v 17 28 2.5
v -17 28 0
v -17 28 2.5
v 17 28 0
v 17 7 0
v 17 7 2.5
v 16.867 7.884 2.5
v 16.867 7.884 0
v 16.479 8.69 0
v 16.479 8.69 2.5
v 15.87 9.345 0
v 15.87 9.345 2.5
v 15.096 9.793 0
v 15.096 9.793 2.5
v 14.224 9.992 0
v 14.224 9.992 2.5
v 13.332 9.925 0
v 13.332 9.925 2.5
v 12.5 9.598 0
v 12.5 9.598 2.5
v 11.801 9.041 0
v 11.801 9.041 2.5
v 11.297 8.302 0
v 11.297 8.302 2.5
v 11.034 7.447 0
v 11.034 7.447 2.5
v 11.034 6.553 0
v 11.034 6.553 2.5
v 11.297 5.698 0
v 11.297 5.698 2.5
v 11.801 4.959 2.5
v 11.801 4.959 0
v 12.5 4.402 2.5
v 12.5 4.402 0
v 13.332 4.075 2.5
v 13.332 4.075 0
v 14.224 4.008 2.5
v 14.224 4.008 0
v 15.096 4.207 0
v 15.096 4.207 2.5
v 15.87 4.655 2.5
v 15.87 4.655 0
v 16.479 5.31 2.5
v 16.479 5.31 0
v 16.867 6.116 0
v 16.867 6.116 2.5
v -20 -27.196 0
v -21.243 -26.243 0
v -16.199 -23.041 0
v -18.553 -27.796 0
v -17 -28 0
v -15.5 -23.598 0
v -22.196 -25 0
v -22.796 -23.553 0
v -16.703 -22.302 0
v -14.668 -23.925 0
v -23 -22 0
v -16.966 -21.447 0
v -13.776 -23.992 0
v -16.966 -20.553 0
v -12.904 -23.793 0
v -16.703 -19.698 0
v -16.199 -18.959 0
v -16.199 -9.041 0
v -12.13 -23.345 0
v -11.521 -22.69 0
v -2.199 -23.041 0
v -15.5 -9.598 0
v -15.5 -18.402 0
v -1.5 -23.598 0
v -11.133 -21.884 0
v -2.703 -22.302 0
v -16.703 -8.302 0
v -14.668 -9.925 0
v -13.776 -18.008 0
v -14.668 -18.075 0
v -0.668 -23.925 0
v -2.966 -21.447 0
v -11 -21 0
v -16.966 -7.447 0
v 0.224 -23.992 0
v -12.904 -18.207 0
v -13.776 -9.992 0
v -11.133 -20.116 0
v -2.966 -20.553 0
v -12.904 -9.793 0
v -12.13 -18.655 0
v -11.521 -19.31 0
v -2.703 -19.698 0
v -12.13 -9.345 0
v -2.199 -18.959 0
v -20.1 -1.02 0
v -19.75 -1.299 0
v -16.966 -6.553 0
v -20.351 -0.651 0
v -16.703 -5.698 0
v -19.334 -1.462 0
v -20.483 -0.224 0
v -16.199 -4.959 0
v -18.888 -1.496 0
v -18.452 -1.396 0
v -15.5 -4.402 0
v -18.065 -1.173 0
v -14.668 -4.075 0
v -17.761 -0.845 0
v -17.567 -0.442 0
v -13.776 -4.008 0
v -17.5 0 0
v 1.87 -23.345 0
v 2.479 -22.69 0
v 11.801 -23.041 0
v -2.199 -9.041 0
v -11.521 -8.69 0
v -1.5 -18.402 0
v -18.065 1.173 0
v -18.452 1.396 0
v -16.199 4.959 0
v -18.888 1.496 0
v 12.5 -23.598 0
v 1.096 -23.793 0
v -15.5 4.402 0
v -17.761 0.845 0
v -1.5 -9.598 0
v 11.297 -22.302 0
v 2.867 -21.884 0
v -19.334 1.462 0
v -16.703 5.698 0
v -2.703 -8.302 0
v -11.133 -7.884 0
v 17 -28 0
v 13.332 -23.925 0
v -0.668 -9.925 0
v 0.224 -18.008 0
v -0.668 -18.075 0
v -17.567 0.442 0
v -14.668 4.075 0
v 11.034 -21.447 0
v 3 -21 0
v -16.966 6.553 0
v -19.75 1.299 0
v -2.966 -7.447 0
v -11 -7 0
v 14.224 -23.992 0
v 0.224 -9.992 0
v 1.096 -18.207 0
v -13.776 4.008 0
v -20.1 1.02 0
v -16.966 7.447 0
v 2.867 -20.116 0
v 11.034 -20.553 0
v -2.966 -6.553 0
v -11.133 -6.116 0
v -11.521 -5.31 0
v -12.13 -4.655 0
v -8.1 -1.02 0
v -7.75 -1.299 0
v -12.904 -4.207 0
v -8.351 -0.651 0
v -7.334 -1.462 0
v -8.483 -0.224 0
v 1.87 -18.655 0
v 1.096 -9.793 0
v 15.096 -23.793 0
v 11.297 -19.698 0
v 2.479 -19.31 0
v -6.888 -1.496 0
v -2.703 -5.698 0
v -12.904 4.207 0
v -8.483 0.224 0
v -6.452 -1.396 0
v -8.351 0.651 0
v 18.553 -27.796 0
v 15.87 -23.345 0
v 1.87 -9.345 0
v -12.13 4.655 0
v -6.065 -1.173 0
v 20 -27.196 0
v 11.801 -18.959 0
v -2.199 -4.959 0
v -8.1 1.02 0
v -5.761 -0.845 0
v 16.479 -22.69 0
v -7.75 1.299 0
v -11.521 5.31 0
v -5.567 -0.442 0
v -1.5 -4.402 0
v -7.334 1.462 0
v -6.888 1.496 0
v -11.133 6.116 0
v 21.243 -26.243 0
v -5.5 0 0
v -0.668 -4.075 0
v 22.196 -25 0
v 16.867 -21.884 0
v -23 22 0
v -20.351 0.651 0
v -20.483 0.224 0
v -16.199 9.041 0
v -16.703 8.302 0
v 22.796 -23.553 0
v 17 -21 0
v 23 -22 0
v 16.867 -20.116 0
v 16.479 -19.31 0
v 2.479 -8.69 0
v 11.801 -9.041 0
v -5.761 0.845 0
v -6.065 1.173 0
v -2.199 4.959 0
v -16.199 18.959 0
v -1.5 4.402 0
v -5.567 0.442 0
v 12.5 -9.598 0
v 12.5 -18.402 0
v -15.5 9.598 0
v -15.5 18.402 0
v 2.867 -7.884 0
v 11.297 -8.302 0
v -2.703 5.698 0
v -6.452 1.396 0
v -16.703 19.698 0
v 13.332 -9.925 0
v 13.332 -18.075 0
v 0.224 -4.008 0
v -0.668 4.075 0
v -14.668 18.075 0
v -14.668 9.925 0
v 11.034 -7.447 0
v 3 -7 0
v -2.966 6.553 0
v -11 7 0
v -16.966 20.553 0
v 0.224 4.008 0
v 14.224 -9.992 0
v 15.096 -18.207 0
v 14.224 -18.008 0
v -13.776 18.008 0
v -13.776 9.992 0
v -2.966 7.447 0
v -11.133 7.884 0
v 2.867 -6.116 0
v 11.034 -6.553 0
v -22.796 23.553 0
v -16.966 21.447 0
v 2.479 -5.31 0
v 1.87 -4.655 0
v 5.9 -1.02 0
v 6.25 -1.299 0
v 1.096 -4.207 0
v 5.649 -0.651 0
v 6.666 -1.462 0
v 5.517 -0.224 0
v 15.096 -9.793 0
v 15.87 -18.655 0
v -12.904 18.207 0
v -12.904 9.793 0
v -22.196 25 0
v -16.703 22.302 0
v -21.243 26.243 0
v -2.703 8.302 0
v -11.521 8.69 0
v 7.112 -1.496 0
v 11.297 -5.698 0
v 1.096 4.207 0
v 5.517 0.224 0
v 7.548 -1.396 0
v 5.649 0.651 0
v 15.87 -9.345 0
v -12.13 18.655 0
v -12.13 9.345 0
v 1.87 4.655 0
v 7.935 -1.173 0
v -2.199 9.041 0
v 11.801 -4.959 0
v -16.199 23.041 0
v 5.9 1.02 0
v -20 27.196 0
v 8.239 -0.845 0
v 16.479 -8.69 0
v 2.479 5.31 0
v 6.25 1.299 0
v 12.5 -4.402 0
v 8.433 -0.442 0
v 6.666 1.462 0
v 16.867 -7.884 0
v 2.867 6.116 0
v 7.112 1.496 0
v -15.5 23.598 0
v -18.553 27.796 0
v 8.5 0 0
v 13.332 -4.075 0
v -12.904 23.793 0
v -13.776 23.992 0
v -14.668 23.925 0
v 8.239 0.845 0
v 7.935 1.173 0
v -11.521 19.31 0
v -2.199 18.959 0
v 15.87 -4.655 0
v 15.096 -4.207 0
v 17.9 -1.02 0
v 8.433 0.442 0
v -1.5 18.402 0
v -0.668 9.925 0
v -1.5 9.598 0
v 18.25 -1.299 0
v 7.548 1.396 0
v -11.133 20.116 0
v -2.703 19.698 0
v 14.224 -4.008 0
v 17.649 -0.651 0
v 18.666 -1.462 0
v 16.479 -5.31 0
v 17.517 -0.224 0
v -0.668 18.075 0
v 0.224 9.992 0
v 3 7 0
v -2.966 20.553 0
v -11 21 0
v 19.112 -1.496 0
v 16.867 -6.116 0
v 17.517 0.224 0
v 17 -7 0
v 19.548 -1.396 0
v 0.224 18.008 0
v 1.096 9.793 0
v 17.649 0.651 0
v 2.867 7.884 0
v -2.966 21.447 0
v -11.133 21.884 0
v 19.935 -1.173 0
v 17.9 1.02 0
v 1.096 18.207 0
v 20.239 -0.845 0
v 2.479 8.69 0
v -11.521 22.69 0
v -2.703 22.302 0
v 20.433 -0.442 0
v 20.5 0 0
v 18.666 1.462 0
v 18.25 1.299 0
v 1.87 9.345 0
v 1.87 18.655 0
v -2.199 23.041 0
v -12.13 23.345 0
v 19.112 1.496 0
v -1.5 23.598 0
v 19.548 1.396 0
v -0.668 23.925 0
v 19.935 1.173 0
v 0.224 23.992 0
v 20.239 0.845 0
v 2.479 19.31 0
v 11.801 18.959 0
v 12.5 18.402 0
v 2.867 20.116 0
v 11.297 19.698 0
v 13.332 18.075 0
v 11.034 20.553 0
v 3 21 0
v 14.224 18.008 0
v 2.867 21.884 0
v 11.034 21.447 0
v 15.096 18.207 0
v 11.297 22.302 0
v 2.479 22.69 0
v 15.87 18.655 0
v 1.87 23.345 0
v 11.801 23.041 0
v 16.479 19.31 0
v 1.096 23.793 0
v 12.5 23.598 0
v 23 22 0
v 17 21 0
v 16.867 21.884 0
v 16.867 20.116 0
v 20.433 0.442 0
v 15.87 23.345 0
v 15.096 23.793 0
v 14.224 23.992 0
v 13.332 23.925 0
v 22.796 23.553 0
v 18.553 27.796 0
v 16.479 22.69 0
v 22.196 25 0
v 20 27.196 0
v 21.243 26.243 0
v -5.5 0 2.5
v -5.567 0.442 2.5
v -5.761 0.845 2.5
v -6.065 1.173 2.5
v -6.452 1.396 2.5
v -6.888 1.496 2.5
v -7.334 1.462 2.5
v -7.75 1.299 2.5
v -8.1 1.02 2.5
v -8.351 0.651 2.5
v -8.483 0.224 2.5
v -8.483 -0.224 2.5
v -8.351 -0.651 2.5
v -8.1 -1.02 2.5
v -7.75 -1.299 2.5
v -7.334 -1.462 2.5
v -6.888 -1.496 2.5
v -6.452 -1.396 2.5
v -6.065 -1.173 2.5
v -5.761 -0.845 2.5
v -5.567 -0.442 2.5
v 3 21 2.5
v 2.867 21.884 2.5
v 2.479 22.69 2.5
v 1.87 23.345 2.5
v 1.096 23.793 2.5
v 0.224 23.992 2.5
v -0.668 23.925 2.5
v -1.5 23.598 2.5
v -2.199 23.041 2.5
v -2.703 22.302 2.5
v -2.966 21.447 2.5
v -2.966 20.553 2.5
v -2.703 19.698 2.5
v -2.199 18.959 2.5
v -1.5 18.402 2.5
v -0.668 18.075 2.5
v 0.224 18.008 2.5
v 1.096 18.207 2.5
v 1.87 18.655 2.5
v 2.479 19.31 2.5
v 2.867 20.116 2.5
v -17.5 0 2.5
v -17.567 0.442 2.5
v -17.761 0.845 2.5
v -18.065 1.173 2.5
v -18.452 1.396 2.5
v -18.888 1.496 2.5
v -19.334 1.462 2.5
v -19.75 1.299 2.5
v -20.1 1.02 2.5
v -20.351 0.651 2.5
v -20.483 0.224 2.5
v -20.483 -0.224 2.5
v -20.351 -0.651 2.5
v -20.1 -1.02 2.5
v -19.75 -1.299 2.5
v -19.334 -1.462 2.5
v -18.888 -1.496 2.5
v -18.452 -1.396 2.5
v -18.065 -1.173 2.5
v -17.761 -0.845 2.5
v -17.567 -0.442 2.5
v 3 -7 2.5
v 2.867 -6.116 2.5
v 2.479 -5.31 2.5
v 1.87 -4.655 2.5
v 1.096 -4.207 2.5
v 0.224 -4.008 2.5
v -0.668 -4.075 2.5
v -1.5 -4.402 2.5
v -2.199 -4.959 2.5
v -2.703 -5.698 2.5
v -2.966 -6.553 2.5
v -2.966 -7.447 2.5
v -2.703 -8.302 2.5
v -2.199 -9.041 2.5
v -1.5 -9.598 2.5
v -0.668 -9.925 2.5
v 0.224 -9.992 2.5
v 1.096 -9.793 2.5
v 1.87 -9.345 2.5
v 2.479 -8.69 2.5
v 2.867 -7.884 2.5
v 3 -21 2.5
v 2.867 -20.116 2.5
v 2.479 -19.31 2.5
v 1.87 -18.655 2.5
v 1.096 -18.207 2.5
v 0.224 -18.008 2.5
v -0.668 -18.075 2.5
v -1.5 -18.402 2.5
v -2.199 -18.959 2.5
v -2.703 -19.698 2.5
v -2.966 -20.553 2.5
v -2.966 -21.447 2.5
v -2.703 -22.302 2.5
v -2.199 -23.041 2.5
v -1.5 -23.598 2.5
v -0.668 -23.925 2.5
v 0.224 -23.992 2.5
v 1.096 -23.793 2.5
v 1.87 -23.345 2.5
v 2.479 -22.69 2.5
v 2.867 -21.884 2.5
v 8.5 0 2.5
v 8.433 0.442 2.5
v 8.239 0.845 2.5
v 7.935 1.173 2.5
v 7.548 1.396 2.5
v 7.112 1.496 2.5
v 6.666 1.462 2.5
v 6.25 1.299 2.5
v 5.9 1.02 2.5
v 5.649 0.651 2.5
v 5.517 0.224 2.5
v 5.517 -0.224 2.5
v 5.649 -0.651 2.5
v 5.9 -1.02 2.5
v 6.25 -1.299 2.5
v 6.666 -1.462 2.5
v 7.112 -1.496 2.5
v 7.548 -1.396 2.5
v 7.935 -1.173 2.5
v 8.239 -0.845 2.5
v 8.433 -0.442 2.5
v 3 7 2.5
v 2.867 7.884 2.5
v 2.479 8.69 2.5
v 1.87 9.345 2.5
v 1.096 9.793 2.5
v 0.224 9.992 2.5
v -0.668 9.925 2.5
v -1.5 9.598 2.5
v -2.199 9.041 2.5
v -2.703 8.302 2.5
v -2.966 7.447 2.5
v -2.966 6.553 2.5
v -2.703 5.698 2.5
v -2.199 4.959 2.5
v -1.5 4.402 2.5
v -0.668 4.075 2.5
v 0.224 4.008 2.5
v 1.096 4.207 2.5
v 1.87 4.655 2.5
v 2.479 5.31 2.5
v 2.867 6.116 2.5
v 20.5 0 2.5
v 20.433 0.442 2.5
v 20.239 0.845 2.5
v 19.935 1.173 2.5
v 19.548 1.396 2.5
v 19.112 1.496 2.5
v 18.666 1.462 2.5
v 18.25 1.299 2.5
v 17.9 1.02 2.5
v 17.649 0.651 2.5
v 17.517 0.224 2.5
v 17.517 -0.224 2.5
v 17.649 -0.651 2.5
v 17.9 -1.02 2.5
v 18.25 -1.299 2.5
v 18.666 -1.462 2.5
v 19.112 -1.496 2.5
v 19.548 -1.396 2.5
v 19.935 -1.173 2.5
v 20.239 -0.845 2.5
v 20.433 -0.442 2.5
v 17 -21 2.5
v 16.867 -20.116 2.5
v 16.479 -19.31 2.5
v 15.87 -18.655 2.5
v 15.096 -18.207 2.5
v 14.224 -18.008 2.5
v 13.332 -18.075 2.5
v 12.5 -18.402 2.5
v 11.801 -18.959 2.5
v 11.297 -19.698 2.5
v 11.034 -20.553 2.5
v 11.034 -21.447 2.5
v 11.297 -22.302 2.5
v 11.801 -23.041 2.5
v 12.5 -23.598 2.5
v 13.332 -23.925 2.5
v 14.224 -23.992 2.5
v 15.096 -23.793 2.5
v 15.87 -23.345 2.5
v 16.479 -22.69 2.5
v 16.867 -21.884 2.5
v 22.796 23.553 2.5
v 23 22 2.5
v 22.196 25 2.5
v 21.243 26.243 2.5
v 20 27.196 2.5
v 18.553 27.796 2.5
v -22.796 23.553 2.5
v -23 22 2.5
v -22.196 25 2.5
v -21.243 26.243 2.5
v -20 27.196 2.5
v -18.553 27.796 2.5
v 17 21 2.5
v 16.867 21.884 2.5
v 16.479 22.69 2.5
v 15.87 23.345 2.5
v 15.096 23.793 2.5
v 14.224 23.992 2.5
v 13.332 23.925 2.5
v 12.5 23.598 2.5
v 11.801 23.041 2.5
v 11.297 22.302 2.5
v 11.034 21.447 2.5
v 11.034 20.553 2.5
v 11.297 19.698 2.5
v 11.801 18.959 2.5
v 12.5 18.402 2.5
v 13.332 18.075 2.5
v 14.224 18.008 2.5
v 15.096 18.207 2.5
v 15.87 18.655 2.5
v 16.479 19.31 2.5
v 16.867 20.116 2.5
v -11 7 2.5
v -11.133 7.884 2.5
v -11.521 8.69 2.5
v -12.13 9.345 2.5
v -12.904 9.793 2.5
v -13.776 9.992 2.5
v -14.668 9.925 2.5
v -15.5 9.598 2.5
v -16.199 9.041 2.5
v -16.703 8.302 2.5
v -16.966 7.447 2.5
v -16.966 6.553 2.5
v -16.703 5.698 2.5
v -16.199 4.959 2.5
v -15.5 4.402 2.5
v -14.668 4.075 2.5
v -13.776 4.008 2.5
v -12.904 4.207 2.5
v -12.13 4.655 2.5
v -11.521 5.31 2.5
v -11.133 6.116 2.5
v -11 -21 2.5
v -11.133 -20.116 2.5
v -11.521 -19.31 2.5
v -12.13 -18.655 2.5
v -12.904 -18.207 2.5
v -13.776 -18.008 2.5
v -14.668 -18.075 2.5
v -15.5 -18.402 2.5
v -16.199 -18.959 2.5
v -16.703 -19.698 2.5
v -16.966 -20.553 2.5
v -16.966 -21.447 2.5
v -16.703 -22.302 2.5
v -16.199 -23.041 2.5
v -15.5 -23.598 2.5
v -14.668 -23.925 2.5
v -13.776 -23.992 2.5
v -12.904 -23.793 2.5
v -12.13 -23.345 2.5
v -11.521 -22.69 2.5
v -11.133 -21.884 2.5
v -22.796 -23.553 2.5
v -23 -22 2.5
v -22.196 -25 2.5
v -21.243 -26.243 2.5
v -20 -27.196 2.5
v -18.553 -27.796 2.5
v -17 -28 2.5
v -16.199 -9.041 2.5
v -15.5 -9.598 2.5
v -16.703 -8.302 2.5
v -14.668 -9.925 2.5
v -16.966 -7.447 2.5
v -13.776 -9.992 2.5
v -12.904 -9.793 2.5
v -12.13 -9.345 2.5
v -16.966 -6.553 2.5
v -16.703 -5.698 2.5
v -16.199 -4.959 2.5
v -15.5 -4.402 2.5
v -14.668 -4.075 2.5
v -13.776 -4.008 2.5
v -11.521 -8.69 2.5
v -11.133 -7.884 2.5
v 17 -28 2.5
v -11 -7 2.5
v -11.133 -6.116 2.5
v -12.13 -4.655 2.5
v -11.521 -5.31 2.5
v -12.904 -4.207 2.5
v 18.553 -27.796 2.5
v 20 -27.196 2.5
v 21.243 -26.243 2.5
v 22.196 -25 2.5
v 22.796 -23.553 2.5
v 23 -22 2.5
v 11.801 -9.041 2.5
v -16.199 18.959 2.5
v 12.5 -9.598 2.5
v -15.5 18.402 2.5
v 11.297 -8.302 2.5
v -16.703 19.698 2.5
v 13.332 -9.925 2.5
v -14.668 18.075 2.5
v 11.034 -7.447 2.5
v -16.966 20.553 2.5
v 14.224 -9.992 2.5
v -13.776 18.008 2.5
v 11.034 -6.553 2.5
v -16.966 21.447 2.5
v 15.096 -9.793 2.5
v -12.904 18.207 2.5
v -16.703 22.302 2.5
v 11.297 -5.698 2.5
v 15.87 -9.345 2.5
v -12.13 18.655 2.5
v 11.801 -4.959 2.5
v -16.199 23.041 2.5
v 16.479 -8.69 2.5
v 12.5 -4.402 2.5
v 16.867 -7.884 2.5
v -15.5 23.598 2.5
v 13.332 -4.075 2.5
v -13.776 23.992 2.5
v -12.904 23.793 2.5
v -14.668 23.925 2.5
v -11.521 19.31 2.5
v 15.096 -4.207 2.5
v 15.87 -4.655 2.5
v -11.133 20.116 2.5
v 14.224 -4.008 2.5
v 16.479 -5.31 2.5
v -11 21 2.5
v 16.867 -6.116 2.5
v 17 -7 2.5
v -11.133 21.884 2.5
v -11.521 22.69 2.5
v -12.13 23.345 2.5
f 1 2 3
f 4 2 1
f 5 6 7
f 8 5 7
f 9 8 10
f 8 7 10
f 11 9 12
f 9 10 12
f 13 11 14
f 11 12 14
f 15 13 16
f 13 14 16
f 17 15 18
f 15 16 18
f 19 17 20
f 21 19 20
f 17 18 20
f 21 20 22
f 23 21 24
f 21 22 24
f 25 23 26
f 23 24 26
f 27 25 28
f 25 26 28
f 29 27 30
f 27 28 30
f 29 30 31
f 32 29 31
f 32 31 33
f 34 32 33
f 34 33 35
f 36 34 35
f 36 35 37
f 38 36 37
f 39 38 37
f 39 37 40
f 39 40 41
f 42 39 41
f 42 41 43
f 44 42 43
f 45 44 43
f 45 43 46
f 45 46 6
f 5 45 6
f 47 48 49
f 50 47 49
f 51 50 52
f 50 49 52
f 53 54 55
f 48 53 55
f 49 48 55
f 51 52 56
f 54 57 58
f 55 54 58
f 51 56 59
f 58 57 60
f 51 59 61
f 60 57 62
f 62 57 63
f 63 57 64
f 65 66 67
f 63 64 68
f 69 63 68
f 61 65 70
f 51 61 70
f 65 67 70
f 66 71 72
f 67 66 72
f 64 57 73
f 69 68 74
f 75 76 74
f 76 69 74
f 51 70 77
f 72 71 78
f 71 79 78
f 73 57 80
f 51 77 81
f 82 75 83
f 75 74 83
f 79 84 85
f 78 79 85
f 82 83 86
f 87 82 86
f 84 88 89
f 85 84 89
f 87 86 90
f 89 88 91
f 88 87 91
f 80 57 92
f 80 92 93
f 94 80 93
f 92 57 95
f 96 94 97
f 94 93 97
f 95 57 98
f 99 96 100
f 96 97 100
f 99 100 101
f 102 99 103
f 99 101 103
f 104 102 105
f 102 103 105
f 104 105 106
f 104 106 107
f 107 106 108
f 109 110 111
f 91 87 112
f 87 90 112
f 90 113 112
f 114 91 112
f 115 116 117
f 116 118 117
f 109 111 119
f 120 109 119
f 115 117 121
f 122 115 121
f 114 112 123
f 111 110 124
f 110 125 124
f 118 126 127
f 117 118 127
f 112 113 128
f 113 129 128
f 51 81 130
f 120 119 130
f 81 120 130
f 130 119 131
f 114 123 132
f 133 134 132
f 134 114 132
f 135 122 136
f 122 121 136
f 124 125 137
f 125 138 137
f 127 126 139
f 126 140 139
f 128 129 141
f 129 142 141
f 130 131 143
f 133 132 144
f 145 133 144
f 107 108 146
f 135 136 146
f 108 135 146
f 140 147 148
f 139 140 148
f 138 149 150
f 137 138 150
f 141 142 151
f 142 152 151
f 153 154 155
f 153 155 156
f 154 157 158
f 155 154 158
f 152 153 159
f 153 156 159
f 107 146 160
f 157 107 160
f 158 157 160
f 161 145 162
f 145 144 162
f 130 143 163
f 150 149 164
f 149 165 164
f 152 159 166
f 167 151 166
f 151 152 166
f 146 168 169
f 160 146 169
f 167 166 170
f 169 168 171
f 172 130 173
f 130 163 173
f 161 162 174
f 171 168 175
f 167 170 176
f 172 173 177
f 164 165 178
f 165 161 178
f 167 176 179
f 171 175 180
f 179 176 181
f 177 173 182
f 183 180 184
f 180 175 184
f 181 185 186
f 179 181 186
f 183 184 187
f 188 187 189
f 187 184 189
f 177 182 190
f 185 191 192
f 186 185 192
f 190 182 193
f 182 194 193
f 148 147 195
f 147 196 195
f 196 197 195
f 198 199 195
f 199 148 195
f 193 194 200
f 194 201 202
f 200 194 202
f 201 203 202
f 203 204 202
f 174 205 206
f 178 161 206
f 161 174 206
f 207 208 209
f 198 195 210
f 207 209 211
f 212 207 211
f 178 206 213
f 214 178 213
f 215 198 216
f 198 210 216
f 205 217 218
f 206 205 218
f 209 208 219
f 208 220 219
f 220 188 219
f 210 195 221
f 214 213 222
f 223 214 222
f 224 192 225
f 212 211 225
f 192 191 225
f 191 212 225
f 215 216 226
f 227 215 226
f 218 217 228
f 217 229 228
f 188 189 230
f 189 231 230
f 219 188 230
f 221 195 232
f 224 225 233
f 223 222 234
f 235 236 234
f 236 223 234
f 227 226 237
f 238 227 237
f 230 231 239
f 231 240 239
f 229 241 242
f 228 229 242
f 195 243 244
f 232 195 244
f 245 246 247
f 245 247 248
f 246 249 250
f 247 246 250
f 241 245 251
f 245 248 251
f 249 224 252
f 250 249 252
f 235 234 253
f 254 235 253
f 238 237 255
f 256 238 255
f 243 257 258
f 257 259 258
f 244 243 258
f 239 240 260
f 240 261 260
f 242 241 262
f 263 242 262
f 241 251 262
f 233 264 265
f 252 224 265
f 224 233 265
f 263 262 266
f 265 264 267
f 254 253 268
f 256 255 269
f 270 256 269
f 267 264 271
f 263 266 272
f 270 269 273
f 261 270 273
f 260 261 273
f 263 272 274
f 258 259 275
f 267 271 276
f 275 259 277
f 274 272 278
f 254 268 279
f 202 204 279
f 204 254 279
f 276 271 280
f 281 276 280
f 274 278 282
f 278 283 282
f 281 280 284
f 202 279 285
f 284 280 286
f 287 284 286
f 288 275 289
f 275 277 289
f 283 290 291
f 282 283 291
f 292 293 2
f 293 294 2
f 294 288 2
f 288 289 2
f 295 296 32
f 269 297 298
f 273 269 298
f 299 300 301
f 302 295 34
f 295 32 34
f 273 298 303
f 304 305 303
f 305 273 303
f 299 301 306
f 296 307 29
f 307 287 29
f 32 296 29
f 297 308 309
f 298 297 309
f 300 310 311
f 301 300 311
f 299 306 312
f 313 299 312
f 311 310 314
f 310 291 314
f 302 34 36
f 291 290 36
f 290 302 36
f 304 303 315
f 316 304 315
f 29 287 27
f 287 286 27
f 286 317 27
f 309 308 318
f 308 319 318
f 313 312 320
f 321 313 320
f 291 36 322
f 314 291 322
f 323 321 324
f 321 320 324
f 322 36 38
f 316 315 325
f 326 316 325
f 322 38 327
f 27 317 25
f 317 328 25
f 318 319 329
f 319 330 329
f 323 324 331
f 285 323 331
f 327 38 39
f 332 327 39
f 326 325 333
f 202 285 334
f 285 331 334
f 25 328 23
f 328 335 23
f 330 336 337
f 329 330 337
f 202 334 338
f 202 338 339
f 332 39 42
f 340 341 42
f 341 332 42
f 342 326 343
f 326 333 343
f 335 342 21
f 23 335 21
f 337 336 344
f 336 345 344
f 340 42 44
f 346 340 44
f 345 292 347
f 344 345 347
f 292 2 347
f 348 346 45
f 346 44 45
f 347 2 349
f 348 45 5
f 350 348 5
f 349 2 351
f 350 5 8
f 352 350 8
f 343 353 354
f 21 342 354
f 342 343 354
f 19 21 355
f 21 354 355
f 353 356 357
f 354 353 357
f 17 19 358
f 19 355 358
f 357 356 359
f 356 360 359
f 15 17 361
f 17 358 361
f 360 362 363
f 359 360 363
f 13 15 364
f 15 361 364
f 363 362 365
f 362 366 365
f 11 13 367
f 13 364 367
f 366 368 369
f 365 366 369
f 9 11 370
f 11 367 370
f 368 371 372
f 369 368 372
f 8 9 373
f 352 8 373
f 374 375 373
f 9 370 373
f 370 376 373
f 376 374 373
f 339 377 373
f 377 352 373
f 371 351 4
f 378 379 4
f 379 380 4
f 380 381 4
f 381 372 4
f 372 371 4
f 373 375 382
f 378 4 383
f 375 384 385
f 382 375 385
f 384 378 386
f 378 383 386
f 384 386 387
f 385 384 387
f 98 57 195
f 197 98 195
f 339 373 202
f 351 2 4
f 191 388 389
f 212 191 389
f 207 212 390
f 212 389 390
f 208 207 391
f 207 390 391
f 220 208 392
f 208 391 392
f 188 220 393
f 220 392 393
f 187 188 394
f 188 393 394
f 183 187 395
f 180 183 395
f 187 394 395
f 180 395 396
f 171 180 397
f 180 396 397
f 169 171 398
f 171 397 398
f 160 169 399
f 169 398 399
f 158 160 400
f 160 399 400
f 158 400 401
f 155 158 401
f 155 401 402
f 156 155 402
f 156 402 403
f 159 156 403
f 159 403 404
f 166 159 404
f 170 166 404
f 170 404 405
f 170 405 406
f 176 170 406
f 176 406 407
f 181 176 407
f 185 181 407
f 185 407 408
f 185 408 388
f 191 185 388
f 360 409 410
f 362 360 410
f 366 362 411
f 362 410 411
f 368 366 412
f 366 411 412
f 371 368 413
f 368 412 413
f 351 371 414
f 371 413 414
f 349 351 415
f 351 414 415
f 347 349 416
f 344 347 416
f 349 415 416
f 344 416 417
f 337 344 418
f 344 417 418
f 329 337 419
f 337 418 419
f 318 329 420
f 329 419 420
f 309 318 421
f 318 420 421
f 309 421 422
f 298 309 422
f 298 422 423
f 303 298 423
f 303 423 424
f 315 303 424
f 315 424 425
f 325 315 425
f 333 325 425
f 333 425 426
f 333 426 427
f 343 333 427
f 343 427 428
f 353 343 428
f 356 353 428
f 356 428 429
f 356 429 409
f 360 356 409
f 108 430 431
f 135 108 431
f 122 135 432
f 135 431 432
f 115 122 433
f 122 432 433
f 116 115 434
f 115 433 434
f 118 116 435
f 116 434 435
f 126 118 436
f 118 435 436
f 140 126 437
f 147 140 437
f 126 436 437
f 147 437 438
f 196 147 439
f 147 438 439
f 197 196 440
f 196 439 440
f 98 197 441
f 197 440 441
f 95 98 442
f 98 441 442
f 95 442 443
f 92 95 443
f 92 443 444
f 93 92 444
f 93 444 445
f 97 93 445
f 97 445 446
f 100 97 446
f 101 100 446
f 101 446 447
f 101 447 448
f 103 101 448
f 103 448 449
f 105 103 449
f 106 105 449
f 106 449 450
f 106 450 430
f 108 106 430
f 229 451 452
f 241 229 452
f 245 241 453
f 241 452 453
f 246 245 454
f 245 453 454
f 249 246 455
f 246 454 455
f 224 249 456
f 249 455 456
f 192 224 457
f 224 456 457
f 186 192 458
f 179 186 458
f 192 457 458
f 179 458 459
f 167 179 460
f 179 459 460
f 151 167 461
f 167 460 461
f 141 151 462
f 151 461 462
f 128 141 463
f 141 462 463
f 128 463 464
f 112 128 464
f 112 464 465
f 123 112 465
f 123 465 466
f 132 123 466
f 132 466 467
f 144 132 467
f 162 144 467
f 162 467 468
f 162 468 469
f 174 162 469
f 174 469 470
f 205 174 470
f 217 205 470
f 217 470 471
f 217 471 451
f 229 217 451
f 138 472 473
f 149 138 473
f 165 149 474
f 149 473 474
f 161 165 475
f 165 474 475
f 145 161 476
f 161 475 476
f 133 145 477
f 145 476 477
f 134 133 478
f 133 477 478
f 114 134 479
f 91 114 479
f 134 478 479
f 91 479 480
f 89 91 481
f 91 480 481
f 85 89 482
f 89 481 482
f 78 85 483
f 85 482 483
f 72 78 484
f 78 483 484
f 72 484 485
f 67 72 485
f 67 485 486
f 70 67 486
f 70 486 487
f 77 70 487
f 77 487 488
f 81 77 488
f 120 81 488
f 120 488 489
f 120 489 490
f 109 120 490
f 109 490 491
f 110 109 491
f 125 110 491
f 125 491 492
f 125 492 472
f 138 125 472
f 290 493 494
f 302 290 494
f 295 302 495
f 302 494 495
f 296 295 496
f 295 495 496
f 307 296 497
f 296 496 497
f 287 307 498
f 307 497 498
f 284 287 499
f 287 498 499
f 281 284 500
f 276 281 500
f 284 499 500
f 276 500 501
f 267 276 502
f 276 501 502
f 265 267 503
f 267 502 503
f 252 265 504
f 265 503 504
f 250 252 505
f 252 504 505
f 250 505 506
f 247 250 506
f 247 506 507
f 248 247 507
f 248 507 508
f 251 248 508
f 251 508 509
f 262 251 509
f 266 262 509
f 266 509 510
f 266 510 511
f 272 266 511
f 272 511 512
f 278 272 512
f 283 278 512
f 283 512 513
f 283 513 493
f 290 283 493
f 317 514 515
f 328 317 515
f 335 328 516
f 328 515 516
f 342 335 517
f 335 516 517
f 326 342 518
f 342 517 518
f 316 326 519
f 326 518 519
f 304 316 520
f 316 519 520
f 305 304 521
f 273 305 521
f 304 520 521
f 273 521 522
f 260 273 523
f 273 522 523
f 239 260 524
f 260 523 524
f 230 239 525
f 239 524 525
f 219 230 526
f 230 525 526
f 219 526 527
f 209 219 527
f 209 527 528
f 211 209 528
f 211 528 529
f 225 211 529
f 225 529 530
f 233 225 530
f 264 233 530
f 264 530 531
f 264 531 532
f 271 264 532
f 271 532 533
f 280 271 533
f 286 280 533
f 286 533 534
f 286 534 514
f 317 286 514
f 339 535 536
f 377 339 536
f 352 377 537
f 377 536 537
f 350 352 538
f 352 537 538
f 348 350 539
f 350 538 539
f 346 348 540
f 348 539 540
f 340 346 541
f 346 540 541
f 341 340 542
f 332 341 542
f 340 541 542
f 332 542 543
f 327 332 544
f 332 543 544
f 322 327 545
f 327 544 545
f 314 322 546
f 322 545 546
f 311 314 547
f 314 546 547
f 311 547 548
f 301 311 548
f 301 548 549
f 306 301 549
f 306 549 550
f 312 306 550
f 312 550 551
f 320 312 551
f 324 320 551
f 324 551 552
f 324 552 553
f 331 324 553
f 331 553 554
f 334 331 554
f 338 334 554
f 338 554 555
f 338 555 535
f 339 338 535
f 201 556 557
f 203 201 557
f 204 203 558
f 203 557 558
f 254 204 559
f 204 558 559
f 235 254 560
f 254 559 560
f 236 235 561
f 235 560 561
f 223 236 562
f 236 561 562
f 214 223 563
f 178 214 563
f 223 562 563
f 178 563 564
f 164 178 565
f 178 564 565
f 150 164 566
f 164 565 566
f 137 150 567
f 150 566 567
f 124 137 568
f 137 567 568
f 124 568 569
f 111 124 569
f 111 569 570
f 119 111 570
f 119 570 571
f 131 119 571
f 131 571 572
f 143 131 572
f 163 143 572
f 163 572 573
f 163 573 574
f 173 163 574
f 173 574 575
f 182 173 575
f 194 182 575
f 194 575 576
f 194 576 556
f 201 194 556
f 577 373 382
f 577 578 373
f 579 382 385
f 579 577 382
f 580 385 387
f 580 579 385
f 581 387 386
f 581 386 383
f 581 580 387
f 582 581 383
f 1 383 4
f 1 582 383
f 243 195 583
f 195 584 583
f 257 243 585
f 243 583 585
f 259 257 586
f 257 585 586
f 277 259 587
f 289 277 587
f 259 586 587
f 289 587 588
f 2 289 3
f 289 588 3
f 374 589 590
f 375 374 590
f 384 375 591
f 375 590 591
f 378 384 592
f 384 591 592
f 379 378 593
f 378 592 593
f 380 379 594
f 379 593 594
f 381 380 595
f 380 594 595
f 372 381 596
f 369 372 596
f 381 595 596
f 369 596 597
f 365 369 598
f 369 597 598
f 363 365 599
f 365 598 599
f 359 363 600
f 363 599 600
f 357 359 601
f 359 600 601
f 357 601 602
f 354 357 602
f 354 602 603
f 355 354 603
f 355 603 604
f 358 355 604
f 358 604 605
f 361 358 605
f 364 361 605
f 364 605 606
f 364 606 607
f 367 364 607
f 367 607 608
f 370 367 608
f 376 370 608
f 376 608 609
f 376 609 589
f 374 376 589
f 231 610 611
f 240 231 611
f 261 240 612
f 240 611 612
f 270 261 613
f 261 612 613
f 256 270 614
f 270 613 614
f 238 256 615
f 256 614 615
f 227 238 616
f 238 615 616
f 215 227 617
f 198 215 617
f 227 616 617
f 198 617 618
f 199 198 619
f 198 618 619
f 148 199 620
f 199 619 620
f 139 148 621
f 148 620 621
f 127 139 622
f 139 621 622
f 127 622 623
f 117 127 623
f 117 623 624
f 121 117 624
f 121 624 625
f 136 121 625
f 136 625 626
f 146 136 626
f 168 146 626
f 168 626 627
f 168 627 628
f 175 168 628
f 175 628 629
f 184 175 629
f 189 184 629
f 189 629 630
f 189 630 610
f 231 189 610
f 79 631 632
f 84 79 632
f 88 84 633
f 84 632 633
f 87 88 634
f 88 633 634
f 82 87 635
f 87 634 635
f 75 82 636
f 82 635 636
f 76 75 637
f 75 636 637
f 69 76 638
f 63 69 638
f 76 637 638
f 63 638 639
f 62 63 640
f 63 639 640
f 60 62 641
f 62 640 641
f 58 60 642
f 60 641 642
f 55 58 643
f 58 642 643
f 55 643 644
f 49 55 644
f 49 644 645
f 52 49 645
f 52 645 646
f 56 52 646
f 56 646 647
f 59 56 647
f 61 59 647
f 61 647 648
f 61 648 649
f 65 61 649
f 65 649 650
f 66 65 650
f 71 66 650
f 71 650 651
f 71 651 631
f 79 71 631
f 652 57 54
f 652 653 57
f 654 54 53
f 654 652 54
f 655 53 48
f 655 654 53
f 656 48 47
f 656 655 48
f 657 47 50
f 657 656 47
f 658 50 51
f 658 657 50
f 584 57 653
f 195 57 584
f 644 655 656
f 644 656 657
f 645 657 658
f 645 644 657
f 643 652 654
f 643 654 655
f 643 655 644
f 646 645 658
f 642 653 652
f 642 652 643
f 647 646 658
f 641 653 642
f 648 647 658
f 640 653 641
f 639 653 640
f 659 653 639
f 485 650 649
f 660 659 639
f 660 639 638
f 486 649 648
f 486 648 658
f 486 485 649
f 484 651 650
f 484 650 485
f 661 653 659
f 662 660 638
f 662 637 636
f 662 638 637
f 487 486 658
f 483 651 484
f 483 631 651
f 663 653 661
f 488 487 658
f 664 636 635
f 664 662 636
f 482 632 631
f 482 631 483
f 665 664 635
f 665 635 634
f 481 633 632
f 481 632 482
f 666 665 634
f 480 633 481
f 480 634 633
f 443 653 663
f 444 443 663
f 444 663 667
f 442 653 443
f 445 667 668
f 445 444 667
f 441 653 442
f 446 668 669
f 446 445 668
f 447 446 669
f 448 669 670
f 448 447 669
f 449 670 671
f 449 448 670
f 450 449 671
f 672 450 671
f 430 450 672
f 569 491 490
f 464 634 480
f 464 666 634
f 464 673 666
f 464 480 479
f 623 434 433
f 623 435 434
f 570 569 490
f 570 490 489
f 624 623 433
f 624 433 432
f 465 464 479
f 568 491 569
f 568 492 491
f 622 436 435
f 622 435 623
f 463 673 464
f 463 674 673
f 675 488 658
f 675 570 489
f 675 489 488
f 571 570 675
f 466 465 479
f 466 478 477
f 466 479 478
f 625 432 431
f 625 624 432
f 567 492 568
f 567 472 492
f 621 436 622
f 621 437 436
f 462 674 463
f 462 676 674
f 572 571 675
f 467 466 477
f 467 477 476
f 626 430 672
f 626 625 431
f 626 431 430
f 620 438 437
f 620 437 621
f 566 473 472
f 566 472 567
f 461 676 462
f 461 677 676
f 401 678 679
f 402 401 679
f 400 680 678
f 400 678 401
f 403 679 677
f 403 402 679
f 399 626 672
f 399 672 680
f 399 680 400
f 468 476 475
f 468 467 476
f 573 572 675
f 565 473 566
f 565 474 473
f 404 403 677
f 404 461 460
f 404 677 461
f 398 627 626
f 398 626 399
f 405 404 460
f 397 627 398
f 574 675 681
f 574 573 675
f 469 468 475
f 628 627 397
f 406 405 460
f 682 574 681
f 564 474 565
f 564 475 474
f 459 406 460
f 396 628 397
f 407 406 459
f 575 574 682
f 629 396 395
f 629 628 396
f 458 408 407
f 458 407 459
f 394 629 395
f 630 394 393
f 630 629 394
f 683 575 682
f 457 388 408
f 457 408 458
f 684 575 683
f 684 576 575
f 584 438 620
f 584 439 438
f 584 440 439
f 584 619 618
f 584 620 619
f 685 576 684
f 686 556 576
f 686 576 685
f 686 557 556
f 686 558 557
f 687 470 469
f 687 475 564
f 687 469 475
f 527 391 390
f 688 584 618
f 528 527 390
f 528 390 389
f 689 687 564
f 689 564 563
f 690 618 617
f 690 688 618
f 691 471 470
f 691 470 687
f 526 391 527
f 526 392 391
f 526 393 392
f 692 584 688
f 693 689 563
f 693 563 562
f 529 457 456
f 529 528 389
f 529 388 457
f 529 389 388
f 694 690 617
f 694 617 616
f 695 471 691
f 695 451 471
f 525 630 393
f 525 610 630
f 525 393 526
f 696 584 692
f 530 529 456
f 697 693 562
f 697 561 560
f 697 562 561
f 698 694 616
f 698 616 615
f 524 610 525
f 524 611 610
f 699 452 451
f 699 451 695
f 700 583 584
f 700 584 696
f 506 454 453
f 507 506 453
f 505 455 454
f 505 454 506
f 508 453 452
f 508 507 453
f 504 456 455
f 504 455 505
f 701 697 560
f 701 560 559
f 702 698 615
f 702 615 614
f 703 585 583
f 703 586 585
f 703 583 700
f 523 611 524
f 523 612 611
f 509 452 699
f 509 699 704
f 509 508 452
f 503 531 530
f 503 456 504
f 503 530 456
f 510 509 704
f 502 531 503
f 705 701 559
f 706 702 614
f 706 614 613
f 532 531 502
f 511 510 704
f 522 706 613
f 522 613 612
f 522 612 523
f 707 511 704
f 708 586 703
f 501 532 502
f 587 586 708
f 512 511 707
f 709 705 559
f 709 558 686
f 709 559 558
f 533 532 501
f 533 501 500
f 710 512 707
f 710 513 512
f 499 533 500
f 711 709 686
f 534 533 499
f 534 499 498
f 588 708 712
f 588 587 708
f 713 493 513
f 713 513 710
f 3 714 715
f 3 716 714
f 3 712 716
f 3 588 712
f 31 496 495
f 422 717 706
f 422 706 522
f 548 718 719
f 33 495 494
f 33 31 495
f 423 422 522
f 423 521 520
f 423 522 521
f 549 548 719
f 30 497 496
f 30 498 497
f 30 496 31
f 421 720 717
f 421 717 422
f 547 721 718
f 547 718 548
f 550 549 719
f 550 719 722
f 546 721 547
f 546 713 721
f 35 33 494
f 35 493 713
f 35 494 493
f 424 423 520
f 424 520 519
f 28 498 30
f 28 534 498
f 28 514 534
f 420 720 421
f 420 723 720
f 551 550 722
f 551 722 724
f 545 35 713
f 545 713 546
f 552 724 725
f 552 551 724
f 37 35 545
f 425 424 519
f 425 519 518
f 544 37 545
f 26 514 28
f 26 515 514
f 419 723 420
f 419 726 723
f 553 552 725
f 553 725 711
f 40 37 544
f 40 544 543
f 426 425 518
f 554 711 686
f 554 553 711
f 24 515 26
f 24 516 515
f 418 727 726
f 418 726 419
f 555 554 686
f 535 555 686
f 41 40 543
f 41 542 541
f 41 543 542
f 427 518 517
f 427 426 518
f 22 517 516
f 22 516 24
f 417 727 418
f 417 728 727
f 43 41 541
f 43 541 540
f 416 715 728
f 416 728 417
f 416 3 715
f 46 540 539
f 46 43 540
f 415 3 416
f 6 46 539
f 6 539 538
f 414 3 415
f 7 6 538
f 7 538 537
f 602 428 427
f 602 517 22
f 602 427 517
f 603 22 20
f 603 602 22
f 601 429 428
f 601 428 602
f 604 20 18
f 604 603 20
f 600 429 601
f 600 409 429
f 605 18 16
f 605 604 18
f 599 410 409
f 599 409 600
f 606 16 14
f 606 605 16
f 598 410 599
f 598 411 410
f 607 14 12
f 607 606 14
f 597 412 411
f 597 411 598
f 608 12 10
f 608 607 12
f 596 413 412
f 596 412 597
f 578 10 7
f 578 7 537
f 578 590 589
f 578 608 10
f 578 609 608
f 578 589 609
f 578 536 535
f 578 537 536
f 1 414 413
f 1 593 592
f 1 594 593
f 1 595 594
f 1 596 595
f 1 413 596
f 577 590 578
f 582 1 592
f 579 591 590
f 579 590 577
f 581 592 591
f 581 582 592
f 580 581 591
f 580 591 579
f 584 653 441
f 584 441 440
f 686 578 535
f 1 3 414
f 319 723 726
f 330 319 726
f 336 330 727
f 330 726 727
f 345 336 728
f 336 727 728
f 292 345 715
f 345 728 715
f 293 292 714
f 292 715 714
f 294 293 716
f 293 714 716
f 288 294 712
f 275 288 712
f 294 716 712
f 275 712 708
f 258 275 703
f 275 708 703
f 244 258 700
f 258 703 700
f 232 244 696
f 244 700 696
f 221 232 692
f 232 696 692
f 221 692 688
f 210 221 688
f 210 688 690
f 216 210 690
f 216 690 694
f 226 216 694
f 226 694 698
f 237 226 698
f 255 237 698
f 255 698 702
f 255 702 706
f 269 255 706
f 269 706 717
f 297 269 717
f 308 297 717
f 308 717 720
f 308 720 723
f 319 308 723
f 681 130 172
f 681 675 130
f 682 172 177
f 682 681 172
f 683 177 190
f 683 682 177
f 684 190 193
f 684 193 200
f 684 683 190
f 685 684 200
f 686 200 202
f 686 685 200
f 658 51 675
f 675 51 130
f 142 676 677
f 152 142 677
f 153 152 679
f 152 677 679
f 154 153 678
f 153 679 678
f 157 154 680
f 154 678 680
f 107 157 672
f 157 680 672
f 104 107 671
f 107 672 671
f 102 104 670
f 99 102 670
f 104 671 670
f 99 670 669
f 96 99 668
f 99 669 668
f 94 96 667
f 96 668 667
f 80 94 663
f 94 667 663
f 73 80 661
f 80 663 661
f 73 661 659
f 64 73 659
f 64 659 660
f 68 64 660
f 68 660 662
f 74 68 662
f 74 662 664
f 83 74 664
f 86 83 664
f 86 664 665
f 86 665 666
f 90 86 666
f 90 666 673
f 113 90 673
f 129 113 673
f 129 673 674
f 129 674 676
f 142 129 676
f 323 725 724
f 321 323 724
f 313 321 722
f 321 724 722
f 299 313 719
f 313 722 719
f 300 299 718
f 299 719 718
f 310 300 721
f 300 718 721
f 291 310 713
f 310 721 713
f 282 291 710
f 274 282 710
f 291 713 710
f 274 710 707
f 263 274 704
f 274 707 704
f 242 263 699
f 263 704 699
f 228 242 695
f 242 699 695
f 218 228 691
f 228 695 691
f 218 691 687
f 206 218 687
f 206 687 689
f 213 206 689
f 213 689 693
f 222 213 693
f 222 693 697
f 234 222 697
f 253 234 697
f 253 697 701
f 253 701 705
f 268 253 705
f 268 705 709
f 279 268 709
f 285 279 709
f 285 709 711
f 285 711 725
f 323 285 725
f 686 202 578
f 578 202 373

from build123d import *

# Parameters (mm, degrees)
SKETCH_1_W          = 46
SKETCH_1_H          = 56
EXTRUDE_1_DEPTH     = 2.5
FILLET_1_R          = 6
SKETCH_2_R          = 1.5
CUT_EXTRUDE_1_DEPTH = 10
SKETCH_3_R          = 3
CUT_EXTRUDE_2_DEPTH = 10


with BuildPart() as part:
    # 草图1 → 凸台-拉伸1 (new body)
    with BuildSketch(Plane.XY):
        Rectangle(SKETCH_1_W, SKETCH_1_H)
    extrude(amount=EXTRUDE_1_DEPTH)

    # 圆角1
    fillet_1_edges = [part.edges().sort_by_distance(p)[0] for p in [
        (23, -28, 1.25),
        (-23, -28, 1.25),
        (-23, 28, 1.25),
        (23, 28, 1.25),
    ]]
    fillet(fillet_1_edges, radius=FILLET_1_R)

    # 草图2 → 切除-拉伸1 (cut)
    with BuildSketch(Plane.XY.offset(2.5)):
        with Locations((-19, 0)):
            Circle(SKETCH_2_R)
        with Locations((-7, 0)):
            Circle(SKETCH_2_R)
        with Locations((7, 0)):
            Circle(SKETCH_2_R)
        with Locations((19, 0)):
            Circle(SKETCH_2_R)
    extrude(amount=-CUT_EXTRUDE_1_DEPTH, mode=Mode.SUBTRACT)

    # 草图3 → 切除-拉伸2 (cut)
    with BuildSketch(Plane.XY.offset(2.5)):
        with Locations((-14, 7)):
            Circle(SKETCH_3_R)
        with Locations((0, 7)):
            Circle(SKETCH_3_R)
        with Locations((14, 7)):
            Circle(SKETCH_3_R)
        with Locations((-14, -7)):
            Circle(SKETCH_3_R)
        with Locations((0, -7)):
            Circle(SKETCH_3_R)
        with Locations((14, -7)):
            Circle(SKETCH_3_R)
        with Locations((-14, 21)):
            Circle(SKETCH_3_R)
        with Locations((0, 21)):
            Circle(SKETCH_3_R)
        with Locations((14, 21)):
            Circle(SKETCH_3_R)
        with Locations((14, -21)):
            Circle(SKETCH_3_R)
        with Locations((0, -21)):
            Circle(SKETCH_3_R)
        with Locations((-14, -21)):
            Circle(SKETCH_3_R)
    extrude(amount=-CUT_EXTRUDE_2_DEPTH, mode=Mode.SUBTRACT)


solid = part.part
